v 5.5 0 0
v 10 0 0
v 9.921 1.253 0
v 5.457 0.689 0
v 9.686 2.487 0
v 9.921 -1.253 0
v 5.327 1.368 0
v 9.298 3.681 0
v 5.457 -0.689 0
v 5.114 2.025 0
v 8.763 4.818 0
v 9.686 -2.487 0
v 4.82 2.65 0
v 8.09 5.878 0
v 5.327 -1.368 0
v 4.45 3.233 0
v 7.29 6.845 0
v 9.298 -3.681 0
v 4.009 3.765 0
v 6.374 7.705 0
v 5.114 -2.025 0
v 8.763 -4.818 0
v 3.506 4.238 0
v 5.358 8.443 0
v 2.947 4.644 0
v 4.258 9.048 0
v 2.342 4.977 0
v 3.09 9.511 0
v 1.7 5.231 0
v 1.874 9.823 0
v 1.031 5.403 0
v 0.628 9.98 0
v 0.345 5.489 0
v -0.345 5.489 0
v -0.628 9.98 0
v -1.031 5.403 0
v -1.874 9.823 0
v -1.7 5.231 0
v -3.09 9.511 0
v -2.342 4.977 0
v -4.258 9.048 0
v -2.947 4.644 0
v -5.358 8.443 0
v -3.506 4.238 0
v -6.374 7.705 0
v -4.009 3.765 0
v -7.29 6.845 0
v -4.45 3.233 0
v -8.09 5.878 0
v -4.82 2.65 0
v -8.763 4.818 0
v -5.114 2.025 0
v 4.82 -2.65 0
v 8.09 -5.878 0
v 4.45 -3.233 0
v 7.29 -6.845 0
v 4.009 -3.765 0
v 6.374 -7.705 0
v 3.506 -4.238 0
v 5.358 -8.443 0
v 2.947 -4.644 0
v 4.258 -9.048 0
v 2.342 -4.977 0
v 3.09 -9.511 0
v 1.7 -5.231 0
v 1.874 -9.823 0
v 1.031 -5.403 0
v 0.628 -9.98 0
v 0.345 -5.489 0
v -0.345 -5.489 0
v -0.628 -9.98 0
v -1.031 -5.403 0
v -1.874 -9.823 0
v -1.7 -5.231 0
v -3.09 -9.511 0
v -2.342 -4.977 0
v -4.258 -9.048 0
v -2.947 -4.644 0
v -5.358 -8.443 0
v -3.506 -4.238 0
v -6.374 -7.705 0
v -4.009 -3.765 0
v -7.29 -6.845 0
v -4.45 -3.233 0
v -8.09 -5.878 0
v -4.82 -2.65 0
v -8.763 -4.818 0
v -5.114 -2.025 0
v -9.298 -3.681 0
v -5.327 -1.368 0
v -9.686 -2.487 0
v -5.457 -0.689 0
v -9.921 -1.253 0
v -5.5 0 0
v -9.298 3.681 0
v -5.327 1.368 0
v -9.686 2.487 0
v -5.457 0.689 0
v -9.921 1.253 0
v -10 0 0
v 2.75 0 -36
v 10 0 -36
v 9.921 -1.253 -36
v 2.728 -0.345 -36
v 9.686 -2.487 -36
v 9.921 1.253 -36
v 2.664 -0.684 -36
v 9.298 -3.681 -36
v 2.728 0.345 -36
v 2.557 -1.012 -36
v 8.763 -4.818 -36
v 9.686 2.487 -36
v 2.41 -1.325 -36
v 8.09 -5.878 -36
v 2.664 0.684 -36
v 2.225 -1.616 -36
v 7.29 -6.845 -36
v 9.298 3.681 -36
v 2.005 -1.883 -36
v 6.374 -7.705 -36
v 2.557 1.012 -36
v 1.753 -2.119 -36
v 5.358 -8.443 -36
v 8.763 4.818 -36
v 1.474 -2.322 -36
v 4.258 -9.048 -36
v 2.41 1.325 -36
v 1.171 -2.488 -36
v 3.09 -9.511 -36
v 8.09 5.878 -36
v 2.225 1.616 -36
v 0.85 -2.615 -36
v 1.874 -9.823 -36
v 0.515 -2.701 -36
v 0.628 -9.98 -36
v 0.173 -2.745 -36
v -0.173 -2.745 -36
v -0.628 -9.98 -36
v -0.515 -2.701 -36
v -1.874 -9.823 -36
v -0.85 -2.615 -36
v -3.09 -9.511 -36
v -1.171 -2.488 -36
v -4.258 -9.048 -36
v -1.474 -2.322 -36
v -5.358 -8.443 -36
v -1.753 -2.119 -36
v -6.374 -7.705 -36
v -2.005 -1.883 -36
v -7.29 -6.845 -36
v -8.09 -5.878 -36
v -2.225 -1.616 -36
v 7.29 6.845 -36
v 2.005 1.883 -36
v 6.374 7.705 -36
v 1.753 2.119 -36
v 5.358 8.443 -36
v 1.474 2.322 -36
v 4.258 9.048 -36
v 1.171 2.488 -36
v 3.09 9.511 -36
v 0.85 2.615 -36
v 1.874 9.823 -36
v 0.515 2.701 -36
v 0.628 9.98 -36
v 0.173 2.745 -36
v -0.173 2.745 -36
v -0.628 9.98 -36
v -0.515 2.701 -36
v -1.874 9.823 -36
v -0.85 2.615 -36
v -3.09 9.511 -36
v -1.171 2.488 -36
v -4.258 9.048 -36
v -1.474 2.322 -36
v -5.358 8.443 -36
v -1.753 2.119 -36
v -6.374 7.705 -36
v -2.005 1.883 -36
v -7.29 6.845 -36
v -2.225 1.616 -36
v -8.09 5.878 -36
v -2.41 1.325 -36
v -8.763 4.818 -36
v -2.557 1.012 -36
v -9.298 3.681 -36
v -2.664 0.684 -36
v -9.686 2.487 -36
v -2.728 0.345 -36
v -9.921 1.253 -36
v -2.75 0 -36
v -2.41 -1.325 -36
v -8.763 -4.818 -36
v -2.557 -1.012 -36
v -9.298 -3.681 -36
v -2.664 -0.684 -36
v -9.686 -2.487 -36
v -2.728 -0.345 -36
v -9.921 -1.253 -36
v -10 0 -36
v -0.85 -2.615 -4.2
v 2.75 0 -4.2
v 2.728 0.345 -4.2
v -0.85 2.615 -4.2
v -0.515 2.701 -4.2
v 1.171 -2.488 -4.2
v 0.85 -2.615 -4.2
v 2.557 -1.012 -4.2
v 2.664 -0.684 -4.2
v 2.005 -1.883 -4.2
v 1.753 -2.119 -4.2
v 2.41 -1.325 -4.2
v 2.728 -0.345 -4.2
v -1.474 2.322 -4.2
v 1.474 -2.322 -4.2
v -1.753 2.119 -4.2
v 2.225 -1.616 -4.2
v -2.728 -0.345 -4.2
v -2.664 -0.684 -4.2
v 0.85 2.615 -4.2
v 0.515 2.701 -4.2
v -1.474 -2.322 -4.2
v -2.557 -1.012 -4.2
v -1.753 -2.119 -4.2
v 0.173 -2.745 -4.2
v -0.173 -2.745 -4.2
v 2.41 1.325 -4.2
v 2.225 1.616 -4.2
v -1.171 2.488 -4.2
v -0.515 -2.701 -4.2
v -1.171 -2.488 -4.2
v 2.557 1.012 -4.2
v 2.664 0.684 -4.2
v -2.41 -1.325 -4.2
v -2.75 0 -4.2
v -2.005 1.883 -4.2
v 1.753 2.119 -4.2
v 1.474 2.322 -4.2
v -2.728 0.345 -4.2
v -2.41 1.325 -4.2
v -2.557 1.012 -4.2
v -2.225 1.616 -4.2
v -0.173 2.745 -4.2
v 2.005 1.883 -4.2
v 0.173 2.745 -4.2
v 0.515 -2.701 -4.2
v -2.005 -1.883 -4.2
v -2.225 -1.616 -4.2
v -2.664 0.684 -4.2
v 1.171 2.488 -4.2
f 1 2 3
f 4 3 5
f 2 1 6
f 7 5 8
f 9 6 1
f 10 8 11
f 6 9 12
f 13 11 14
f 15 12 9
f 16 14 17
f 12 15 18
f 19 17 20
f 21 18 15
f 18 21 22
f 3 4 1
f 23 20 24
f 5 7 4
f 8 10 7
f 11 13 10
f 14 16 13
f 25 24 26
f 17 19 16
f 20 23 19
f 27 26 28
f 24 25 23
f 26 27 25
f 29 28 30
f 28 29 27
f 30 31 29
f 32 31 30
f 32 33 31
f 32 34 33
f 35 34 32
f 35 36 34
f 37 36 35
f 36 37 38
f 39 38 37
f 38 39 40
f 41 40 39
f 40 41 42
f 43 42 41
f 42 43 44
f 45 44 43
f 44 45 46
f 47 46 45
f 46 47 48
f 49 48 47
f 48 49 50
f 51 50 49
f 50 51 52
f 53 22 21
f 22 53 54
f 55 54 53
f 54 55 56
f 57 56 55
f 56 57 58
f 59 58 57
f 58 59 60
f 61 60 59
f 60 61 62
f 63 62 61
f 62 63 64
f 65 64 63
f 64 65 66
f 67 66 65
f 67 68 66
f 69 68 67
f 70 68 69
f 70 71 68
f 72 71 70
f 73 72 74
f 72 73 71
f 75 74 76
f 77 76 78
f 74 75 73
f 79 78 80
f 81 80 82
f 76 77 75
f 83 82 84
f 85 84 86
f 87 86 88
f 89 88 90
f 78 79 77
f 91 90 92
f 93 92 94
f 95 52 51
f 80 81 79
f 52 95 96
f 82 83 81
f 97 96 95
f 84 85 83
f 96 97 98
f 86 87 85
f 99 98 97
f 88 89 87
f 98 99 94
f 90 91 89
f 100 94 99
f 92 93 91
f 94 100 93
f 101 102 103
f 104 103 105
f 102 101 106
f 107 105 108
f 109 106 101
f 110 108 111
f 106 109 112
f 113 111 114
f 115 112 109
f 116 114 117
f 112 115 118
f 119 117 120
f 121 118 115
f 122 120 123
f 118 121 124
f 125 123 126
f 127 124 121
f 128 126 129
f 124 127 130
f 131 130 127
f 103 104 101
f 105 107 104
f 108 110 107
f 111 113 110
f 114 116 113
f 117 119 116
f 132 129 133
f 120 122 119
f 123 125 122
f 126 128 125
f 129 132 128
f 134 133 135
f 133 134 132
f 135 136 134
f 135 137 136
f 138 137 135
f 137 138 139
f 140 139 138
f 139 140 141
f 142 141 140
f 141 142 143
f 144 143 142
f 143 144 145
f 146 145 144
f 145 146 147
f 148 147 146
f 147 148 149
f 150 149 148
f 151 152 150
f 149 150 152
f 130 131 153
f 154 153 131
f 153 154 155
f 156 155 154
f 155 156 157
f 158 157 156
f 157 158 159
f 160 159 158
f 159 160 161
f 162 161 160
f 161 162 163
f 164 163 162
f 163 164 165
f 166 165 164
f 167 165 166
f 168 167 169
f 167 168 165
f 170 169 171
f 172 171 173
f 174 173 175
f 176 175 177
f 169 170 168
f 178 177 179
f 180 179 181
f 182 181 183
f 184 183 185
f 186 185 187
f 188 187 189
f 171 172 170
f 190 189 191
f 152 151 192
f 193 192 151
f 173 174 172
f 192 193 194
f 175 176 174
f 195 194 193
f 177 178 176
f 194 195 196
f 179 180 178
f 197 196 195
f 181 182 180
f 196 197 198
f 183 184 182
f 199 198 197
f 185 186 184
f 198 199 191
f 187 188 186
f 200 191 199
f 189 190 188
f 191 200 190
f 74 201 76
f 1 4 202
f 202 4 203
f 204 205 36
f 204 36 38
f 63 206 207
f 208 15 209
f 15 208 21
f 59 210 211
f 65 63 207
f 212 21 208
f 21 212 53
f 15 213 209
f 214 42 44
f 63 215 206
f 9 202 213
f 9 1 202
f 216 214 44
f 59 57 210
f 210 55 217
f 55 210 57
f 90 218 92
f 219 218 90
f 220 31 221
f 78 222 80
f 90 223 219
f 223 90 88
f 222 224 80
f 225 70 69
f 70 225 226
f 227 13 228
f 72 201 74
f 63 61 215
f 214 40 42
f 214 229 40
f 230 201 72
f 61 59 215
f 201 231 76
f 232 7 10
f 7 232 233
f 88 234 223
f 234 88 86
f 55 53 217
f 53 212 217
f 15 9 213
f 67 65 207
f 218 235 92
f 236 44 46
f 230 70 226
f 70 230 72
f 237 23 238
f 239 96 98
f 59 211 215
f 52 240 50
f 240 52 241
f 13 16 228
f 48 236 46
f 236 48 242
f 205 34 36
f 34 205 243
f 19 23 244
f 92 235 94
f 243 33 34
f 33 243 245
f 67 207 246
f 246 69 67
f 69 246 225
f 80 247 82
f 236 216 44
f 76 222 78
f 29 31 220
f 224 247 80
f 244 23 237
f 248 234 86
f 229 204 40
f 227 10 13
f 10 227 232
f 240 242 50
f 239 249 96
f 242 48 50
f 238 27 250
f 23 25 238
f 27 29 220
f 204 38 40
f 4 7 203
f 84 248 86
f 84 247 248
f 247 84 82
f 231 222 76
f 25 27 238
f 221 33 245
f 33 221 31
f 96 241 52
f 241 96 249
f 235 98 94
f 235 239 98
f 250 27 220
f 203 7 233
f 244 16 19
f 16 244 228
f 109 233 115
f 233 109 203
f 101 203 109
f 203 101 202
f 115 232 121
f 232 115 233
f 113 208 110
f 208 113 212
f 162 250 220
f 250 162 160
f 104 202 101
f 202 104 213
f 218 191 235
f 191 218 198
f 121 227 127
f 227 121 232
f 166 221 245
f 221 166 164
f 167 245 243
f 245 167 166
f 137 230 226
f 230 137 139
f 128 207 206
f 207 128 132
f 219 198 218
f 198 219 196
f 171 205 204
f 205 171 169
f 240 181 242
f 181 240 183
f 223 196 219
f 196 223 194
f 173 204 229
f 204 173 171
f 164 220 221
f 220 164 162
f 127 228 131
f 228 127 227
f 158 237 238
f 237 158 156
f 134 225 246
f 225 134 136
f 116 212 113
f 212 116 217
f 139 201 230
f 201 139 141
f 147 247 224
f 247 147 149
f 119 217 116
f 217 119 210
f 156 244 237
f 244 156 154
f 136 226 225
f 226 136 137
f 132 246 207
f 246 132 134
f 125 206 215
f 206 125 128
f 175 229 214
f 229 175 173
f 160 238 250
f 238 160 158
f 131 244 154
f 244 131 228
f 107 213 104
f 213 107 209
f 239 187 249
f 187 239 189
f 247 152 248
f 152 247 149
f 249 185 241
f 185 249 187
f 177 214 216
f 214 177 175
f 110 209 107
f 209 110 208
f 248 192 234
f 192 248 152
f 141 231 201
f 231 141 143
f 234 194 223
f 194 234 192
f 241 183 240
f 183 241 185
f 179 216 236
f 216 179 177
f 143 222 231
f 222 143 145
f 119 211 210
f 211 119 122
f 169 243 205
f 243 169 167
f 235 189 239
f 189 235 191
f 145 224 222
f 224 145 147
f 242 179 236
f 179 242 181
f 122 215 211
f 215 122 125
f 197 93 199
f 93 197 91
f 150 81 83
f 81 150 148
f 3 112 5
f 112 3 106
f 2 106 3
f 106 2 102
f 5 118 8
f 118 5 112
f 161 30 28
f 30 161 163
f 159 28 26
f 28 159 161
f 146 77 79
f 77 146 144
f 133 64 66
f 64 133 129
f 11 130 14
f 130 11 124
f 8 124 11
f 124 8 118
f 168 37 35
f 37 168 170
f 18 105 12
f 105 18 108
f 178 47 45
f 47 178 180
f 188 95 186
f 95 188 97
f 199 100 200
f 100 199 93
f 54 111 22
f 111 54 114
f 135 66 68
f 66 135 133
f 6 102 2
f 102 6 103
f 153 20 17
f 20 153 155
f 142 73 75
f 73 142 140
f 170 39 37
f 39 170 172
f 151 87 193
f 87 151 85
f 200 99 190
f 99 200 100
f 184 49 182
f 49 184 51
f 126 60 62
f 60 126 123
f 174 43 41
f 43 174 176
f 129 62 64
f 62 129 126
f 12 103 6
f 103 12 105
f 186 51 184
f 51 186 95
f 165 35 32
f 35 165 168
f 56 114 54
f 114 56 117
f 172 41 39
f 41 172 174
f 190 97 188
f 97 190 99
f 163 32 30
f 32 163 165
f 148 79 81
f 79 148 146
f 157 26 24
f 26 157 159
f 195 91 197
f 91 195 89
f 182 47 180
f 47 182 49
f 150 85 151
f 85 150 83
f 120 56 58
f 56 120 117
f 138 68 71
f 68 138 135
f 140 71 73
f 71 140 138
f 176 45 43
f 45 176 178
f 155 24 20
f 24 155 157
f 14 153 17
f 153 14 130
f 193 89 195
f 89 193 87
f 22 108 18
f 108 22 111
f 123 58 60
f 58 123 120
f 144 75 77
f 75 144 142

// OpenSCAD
$fn = 50;


difference() {
	union() {
		translate(v = [0, 0, -36.0000000000]) {
			cylinder(h = 36, r = 10.0000000000);
		}
		cylinder(h = 0, r = 16.0000000000);
	}
	union() {
		translate(v = [0, 0, 0]) {
			rotate(a = [0, 0, 0]) {
				difference() {
					union() {
						#translate(v = [0, 0, -36.0000000000]) {
							cylinder(h = 36, r = 2.2500000000);
						}
						#translate(v = [0, 0, -4.2000000000]) {
							cylinder(h = 4.2000000000, r = 10.0000000000, r1 = 2.7500000000, r2 = 5.5000000000);
						}
						#translate(v = [0, 0, -36.0000000000]) {
							cylinder(h = 36, r = 2.7500000000);
						}
						#translate(v = [0, 0, -36.0000000000]) {
							cylinder(h = 36, r = 2.2500000000);
						}
					}
					union();
				}
			}
		}
	}
}
